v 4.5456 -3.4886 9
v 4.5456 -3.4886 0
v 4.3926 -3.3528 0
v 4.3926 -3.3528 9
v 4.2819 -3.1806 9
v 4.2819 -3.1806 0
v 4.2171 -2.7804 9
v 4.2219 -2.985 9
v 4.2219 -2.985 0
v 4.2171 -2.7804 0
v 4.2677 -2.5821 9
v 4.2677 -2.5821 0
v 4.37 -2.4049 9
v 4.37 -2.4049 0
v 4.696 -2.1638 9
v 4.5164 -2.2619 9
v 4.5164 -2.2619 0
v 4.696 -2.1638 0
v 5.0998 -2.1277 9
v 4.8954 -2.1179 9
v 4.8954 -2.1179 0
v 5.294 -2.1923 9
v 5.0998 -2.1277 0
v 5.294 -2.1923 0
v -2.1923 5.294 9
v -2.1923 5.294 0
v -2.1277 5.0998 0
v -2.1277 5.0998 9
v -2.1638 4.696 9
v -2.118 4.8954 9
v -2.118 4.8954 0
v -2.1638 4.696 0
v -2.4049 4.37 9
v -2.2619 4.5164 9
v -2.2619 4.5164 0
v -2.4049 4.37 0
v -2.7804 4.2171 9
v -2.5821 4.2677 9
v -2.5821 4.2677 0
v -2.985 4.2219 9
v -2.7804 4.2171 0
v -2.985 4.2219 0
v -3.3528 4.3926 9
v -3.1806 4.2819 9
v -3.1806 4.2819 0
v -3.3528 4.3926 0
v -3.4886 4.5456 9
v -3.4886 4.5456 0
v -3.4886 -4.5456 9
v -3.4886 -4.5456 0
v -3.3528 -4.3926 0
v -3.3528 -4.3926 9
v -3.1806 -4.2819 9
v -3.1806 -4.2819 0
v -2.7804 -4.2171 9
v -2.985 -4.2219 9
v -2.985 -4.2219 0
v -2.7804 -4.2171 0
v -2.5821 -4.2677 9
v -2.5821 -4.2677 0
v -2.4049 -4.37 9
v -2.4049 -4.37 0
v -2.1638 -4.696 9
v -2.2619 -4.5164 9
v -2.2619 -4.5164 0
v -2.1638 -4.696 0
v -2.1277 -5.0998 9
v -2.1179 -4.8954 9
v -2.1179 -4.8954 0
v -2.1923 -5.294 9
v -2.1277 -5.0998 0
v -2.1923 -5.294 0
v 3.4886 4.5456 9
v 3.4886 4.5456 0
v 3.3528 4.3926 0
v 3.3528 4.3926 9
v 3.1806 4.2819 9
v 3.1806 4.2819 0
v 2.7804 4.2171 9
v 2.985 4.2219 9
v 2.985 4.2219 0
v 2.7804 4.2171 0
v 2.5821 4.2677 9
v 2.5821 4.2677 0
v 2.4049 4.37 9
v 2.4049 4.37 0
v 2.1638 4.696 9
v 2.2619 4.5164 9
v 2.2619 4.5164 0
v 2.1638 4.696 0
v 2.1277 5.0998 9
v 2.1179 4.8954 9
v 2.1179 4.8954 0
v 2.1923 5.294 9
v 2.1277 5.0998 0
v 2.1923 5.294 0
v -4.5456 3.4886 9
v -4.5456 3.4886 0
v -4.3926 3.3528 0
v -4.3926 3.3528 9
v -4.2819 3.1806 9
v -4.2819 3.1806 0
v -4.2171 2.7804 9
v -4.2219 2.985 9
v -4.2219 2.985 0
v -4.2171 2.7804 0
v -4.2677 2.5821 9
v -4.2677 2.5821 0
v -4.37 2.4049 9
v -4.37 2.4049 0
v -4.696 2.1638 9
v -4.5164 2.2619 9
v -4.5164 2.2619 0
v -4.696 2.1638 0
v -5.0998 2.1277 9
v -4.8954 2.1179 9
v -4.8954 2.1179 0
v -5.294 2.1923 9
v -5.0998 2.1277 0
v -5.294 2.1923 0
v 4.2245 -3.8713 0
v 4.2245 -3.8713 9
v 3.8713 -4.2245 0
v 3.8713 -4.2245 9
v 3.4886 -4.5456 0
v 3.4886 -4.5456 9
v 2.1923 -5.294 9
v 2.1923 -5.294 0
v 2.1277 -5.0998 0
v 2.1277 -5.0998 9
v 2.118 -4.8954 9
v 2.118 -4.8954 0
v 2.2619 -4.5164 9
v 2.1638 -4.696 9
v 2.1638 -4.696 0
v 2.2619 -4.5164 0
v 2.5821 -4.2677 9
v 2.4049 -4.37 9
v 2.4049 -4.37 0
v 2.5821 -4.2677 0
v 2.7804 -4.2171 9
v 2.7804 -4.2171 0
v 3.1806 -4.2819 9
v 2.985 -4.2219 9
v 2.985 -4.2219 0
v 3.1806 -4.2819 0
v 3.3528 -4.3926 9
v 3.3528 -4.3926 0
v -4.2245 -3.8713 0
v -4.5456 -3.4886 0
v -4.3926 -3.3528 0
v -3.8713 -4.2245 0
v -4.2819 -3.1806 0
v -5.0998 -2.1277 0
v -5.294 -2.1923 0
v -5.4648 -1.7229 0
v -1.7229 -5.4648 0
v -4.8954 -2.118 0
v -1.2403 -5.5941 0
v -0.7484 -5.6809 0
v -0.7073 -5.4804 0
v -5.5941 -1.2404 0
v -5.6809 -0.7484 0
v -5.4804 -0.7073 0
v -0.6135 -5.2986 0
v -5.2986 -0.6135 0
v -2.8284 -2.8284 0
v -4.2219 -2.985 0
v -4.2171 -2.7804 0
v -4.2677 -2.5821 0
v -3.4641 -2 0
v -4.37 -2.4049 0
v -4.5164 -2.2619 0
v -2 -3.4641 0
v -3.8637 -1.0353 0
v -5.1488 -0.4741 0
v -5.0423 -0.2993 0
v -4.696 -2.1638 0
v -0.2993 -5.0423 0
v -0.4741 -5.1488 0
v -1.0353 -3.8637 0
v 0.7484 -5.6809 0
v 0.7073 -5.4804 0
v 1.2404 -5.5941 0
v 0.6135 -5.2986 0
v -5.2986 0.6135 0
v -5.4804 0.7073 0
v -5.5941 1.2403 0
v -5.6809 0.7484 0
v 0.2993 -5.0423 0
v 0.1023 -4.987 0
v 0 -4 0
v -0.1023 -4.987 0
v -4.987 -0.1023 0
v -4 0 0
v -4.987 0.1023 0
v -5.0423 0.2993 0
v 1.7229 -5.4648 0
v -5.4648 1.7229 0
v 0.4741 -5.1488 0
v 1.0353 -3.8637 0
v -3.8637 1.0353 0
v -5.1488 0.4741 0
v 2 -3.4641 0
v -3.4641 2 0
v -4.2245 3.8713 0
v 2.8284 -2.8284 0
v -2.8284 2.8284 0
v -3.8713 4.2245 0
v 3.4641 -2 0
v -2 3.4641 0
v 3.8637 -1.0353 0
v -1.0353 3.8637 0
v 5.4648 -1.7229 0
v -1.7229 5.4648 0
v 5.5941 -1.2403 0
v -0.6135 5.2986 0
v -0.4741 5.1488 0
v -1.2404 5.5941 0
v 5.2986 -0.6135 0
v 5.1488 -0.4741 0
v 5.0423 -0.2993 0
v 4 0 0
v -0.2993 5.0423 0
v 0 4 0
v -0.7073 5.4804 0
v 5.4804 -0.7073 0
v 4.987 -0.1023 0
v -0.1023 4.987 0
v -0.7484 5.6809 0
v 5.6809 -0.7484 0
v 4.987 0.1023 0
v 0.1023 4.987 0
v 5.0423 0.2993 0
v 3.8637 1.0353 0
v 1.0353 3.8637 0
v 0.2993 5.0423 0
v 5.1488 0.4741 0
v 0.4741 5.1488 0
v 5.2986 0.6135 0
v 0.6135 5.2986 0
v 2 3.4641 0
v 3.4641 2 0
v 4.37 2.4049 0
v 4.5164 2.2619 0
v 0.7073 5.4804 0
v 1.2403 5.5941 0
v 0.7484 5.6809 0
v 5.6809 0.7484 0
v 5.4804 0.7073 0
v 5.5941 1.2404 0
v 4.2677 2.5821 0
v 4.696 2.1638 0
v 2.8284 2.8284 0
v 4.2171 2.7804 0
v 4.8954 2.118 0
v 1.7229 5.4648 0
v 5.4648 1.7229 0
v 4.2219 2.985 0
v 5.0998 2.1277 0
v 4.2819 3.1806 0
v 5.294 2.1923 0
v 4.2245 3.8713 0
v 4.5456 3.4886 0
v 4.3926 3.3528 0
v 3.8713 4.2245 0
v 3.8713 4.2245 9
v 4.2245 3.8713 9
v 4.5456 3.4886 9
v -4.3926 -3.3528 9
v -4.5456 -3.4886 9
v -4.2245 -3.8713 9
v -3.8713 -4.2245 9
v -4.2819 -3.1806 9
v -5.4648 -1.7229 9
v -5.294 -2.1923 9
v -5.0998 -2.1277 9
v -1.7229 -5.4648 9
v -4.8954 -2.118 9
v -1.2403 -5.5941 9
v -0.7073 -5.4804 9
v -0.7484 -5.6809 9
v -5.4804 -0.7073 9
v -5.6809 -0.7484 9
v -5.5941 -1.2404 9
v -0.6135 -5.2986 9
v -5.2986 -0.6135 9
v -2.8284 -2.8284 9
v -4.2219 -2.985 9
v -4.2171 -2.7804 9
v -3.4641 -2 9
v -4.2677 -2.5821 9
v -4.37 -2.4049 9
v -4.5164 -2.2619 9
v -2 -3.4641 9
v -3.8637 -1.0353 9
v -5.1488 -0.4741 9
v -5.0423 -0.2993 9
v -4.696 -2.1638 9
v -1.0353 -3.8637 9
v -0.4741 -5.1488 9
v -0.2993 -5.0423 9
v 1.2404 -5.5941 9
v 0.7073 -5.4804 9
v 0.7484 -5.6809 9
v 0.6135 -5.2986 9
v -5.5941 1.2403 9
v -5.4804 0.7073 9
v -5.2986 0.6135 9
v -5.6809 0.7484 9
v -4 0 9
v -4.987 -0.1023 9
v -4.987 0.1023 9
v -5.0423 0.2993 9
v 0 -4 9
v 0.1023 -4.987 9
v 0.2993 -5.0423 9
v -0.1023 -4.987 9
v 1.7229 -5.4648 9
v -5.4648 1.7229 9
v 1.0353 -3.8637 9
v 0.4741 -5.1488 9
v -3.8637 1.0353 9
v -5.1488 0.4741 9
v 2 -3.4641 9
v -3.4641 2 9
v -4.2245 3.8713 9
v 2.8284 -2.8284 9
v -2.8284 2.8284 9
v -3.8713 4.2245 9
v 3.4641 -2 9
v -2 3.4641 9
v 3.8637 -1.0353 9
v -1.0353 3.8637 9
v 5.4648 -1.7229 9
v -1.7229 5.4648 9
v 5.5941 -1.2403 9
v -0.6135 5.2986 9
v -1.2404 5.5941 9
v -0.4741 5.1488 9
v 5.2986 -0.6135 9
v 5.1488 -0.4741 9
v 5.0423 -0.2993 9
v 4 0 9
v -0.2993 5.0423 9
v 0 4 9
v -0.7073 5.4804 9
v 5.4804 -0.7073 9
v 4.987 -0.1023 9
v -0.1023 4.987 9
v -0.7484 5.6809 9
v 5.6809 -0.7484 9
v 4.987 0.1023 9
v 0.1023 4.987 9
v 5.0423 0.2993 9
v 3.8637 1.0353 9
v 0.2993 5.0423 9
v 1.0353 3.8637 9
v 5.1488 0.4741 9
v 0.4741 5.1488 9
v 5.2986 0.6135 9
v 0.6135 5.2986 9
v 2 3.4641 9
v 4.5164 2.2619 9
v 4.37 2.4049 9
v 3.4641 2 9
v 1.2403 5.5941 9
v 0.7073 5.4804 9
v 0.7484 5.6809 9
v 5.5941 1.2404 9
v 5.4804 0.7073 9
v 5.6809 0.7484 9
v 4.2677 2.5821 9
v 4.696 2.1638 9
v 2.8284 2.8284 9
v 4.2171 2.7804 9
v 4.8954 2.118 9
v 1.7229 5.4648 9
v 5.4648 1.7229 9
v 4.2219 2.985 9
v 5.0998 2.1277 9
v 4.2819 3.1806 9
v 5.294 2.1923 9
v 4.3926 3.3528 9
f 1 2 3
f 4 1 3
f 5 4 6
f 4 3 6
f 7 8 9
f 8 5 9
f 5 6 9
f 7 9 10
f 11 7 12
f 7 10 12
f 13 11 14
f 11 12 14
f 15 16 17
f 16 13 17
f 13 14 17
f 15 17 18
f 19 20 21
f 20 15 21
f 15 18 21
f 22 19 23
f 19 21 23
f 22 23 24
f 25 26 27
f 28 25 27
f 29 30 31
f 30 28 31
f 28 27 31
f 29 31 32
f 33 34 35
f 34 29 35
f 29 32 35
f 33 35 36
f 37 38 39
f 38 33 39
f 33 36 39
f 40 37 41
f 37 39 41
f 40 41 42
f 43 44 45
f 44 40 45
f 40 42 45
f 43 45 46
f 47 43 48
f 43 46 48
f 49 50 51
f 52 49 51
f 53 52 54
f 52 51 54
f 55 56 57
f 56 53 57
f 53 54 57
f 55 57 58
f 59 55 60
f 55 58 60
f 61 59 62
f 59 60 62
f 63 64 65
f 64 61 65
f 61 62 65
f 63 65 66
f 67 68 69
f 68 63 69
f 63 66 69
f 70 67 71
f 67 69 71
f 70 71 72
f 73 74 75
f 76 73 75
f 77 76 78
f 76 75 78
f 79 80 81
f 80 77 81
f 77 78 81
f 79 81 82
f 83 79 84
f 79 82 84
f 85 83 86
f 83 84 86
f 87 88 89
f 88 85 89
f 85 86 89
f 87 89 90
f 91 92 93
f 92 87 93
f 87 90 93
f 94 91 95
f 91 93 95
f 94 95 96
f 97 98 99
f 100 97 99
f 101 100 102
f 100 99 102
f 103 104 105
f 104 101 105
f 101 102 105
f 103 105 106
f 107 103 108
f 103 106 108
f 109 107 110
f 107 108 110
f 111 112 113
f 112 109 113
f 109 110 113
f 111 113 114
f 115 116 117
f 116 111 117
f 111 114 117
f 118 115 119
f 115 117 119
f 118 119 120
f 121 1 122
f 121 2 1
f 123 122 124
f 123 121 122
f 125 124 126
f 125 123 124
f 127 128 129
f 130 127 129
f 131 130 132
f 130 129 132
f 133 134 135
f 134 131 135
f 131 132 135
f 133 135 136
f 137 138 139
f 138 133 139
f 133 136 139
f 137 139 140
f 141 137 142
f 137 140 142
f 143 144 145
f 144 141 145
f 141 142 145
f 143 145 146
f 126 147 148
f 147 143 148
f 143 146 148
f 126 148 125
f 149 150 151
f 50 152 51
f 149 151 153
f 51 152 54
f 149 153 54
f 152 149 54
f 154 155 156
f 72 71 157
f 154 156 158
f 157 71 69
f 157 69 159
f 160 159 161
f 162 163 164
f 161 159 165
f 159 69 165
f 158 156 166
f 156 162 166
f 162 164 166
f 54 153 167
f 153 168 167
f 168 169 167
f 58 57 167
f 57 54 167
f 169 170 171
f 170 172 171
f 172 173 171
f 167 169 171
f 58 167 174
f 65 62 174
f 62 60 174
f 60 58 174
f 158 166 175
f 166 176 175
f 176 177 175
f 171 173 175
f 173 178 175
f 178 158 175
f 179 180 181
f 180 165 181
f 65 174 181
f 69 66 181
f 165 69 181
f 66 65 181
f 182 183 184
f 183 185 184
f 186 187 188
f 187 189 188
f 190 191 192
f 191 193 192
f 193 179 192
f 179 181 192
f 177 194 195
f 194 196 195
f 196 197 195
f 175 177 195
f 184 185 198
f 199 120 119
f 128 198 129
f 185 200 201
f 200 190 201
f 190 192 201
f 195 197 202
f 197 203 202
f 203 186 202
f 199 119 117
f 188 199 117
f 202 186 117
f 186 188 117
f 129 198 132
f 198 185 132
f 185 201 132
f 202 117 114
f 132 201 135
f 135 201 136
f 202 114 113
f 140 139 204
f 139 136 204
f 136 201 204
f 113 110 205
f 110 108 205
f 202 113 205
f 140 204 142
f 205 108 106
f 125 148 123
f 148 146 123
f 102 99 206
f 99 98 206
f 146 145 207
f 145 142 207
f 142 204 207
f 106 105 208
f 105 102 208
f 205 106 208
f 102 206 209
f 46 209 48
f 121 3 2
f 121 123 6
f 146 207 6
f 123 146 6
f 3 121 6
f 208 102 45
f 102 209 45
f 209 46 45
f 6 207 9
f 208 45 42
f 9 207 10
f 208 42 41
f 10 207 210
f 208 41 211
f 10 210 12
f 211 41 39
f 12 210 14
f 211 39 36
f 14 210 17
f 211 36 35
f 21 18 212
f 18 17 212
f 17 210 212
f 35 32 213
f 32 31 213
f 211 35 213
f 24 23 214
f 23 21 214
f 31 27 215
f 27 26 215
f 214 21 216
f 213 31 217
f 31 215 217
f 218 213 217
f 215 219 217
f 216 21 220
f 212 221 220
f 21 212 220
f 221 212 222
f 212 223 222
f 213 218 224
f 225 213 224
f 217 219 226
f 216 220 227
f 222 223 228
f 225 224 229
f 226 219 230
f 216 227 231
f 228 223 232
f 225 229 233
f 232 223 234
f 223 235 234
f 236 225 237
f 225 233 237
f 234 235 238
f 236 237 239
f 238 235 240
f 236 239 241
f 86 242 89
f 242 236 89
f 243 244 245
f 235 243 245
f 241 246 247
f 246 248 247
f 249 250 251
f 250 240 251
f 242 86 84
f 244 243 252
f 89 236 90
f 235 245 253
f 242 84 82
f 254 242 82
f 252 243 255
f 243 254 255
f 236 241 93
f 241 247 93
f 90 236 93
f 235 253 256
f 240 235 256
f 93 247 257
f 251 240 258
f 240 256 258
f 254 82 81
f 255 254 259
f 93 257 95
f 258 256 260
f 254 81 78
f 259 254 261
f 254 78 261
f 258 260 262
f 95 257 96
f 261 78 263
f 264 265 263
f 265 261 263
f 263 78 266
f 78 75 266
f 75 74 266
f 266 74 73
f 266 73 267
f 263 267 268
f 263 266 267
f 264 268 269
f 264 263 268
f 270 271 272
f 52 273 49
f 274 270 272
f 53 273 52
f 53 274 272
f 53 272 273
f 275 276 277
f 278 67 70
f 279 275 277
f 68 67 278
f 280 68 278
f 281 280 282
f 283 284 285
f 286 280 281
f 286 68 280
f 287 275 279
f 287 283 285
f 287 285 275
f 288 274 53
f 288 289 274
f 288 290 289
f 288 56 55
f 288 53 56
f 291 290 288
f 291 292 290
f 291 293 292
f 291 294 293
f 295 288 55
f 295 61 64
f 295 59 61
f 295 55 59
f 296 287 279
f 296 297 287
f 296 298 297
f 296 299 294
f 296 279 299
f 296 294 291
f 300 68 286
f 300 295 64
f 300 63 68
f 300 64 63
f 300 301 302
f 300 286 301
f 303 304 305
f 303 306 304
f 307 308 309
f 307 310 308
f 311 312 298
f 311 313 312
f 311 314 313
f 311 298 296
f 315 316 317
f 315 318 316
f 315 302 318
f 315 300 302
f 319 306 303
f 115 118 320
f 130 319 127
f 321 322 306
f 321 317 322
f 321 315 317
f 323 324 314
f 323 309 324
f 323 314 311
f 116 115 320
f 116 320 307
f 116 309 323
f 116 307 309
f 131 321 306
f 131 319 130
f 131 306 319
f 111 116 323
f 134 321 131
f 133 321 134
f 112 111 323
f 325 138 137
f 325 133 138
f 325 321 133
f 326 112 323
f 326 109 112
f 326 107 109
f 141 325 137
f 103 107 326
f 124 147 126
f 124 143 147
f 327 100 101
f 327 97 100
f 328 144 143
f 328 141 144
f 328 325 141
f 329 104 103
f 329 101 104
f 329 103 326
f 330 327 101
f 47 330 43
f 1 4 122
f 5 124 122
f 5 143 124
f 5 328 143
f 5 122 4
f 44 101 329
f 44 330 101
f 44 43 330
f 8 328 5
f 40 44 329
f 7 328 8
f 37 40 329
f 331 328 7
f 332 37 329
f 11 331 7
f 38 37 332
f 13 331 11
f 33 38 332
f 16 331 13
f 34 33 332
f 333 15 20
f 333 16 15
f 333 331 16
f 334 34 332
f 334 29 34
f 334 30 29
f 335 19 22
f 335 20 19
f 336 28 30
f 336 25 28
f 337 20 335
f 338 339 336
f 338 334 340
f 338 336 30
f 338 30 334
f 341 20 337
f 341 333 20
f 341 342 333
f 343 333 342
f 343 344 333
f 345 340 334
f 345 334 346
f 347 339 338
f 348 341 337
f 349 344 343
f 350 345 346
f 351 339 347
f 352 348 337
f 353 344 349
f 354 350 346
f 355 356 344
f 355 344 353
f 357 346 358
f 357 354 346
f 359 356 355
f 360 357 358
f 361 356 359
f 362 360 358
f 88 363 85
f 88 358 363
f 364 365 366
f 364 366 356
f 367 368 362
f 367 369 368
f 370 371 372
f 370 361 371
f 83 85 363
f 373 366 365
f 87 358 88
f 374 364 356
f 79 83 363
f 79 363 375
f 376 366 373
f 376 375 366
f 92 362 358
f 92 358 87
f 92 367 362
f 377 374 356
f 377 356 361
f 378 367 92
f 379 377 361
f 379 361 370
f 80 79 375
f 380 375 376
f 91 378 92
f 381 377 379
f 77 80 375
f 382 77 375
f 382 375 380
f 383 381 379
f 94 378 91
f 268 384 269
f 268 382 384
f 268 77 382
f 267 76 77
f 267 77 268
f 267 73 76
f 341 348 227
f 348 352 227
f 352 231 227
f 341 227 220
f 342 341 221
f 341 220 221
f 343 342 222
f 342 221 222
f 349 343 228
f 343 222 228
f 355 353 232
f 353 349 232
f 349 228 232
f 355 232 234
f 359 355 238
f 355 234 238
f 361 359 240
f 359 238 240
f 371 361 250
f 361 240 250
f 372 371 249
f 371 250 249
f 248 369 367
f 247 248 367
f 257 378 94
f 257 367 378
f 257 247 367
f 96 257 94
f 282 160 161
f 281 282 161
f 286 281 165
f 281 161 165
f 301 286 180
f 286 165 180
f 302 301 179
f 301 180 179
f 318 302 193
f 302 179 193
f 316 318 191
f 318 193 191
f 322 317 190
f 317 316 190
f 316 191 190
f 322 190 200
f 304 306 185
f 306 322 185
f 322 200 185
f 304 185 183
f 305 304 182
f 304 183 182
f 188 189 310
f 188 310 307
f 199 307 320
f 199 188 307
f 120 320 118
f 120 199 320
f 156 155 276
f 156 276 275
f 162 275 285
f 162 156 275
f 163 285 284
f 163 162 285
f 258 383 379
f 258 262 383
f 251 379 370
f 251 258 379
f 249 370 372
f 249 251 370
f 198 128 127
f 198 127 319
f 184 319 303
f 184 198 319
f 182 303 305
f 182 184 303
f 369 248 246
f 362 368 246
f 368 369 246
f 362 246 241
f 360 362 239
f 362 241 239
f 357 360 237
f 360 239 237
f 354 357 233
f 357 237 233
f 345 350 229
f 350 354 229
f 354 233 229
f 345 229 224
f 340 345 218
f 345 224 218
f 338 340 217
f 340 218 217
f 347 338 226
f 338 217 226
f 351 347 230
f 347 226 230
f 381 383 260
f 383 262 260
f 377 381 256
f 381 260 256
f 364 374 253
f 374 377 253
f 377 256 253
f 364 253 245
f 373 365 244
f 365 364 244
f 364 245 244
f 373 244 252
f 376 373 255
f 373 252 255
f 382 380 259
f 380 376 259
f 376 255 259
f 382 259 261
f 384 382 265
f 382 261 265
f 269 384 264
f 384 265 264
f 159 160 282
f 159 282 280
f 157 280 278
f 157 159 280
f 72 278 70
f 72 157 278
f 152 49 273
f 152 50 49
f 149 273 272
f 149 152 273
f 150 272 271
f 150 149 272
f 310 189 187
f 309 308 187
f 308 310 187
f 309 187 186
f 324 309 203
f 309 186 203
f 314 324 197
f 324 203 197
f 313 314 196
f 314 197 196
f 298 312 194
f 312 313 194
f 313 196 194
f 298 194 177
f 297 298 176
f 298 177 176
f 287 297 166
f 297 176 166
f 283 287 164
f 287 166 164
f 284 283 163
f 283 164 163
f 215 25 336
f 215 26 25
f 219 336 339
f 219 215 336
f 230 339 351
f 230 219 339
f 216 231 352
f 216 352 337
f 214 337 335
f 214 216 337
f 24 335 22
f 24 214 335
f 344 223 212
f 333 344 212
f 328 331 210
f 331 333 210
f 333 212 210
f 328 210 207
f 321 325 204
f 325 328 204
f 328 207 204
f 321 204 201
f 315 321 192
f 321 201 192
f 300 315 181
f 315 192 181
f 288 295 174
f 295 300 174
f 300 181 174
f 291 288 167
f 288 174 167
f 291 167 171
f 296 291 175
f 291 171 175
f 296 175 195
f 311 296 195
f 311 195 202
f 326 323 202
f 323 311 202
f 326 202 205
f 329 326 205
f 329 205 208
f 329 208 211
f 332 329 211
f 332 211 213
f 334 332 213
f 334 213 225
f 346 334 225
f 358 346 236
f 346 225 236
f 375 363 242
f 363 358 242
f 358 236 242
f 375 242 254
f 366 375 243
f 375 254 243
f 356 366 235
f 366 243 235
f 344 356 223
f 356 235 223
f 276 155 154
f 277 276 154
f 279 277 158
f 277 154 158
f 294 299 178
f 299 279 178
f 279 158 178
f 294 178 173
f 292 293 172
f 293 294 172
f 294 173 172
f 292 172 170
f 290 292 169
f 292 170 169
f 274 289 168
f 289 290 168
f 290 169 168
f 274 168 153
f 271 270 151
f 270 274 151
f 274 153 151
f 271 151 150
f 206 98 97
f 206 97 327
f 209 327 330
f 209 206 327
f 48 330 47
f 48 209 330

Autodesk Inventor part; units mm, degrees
ref_plane "YZ Plane" through (0, 0, 0) normal (1, 0, 0) x (0, 1, 0)
ref_plane "XZ Plane" through (0, 0, 0) normal (0, 1, 0) x (-1, 0, 0)
ref_plane "XY Plane" through (0, 0, 0) normal (0, 0, 1) x (1, 0, 0)
sketch "Sketch1" plane through (0, 0, 0) normal (0, 0, 1) x (1, 0, 0)
  circle A0 centre (0, 0) radius 4
  arc A1 (-0.7484, 5.6809) -> (0.7484, 5.6809) centre (0, 5.73) ccw
  arc A2 (-3.4886, 4.5456) -> (-2.1923, 5.294) centre (-2.865, 4.9623) ccw
  arc A3 (-5.294, 2.1923) -> (-4.5456, 3.4886) centre (-4.9623, 2.865) ccw
  arc A4 (-5.6809, -0.7484) -> (-5.6809, 0.7484) centre (-5.73, 0) ccw
  arc A5 (-4.5456, -3.4886) -> (-5.294, -2.1923) centre (-4.9623, -2.865) ccw
  arc A6 (-2.1923, -5.294) -> (-3.4886, -4.5456) centre (-2.865, -4.9623) ccw
  arc A7 (0.7484, -5.6809) -> (-0.7484, -5.6809) centre (0, -5.73) ccw
  arc A8 (3.4886, -4.5456) -> (2.1923, -5.294) centre (2.865, -4.9623) ccw
  arc A9 (5.294, -2.1923) -> (4.5456, -3.4886) centre (4.9623, -2.865) ccw
  arc A10 (5.6809, 0.7484) -> (5.6809, -0.7484) centre (5.73, 0) ccw
  arc A11 (4.5456, 3.4886) -> (5.294, 2.1923) centre (4.9623, 2.865) ccw
  arc A12 (2.1923, 5.294) -> (3.4886, 4.5456) centre (2.865, 4.9623) ccw
  arc A13 (-0.7484, 5.6809) -> (-2.1923, 5.294) centre (0, 0) ccw
  arc A14 (-3.4886, 4.5456) -> (-4.5456, 3.4886) centre (0, 0) ccw
  arc A15 (-5.294, 2.1923) -> (-5.6809, 0.7484) centre (0, 0) ccw
  arc A16 (-5.6809, -0.7484) -> (-5.294, -2.1923) centre (0, 0) ccw
  arc A17 (2.1923, 5.294) -> (0.7484, 5.6809) centre (0, 0) ccw
  arc A18 (4.5456, 3.4886) -> (3.4886, 4.5456) centre (0, 0) ccw
  arc A19 (5.6809, 0.7484) -> (5.294, 2.1923) centre (0, 0) ccw
  arc A20 (5.294, -2.1923) -> (5.6809, -0.7484) centre (0, 0) ccw
  arc A21 (3.4886, -4.5456) -> (4.5456, -3.4886) centre (0, 0) ccw
  arc A22 (0.7484, -5.6809) -> (2.1923, -5.294) centre (0, 0) ccw
  arc A23 (-4.5456, -3.4886) -> (-3.4886, -4.5456) centre (0, 0) ccw
  arc A24 (-2.1923, -5.294) -> (-0.7484, -5.6809) centre (0, 0) ccw
  dimension "d0" = 8
  dimension "d2" = 1.5
  dimension "d5" = 360
extrude "Extrusion1" add sketch "Sketch1" along normal blind 9
properties part number "poulie 12 dents"
